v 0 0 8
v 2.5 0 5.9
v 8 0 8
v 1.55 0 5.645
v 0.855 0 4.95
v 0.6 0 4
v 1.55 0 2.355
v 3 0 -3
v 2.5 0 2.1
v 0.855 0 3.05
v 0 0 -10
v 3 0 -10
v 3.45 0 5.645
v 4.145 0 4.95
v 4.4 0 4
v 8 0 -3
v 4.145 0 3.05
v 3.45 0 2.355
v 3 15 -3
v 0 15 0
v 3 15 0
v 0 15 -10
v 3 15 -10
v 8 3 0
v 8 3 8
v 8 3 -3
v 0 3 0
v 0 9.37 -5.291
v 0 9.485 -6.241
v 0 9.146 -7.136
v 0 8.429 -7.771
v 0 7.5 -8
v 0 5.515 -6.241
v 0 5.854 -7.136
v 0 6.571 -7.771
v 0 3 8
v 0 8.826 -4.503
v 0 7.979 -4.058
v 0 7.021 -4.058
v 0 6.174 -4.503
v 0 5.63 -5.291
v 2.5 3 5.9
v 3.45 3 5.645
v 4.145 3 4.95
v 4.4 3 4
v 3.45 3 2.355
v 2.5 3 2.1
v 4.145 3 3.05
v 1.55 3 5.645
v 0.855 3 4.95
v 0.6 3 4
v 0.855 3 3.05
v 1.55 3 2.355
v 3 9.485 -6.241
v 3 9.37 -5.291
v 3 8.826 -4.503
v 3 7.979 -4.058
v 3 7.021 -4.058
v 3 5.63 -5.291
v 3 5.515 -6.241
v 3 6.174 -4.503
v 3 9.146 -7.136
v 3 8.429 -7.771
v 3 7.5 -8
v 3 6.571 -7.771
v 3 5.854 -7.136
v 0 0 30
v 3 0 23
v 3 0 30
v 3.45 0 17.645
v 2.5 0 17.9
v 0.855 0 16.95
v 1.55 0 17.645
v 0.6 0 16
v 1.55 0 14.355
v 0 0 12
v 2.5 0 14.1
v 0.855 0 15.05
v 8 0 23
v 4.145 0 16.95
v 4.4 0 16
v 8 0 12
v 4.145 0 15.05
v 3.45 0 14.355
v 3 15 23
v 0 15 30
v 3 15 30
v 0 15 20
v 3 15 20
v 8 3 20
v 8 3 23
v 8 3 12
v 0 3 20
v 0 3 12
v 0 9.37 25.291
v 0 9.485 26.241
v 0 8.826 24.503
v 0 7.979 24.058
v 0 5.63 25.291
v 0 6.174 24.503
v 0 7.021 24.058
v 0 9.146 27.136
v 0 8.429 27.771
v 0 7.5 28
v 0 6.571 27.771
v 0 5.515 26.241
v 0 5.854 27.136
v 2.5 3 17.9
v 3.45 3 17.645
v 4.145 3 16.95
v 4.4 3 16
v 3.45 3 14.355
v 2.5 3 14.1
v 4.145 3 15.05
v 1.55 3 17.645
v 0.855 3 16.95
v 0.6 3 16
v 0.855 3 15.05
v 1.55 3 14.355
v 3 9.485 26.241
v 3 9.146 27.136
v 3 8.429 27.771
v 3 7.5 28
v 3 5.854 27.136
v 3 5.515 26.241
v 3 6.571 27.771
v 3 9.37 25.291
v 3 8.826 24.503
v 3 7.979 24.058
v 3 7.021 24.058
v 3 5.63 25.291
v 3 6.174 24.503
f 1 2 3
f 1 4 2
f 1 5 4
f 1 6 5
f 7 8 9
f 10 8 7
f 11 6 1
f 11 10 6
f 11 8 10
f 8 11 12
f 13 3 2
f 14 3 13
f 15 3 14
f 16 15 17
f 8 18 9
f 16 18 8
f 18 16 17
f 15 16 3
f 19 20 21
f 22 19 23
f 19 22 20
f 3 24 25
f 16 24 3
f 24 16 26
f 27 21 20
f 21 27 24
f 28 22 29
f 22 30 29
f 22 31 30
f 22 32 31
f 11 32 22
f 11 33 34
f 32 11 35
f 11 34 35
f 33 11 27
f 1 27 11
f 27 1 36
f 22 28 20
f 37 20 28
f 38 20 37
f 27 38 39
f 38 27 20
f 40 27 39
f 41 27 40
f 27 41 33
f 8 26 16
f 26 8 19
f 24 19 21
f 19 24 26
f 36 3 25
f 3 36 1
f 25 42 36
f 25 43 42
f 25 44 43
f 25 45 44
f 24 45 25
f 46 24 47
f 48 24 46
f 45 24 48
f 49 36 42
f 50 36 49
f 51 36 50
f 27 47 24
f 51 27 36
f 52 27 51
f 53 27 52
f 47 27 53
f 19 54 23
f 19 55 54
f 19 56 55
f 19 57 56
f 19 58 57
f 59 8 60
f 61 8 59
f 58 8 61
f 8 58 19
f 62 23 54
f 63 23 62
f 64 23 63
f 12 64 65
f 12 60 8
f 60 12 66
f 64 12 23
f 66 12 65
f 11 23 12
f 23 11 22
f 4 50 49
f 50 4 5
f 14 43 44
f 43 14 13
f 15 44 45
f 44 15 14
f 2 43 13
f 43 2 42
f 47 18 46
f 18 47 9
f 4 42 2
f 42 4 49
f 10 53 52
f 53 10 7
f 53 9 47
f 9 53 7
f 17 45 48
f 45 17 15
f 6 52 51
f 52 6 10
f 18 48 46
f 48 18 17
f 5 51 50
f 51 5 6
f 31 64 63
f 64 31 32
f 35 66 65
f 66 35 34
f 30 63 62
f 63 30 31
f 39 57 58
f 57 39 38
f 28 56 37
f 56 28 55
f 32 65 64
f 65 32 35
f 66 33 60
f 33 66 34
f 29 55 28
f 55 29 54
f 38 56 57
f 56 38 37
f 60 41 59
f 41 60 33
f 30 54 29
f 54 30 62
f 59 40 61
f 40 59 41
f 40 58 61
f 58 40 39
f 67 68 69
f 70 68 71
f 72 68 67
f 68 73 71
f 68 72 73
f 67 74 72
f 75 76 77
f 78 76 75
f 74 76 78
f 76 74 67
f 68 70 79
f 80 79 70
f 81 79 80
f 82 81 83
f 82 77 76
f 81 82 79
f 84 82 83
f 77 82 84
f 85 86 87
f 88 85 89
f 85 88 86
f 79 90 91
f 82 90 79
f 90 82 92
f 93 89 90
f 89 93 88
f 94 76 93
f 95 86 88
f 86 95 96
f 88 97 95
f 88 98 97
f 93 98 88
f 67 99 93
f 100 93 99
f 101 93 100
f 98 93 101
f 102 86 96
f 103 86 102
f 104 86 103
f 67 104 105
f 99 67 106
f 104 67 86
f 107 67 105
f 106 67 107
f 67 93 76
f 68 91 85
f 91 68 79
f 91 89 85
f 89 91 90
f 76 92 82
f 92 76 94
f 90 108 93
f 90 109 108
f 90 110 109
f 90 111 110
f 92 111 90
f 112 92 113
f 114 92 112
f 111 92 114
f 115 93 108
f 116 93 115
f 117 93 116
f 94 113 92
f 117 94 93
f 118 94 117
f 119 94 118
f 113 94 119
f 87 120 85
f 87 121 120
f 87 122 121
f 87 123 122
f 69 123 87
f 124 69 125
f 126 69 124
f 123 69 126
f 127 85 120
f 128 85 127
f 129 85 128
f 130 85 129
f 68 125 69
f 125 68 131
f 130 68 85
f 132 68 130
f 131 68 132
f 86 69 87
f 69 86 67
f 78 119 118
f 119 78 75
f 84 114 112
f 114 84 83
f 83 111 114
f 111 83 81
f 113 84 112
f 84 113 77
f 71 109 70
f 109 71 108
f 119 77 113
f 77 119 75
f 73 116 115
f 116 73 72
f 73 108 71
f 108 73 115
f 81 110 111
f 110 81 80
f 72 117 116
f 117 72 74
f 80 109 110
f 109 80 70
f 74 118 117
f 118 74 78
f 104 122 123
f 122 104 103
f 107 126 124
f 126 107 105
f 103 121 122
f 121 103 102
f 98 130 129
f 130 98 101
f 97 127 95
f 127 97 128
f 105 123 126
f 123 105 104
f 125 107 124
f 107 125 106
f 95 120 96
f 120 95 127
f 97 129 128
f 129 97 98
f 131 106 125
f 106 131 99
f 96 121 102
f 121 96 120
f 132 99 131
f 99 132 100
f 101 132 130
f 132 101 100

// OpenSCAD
/** \file
 * mounting bracket for 15mm extrusion.
 */


module bracket()
{
	translate([0,0,-3]) linear_extrude(height=3)
		polygon([[0,0], [8,0], [8,3], [3,15], [0,15]]);

	cube([8,3,8]);
	translate([0,0,-10]) cube([3,15,8]);

}
	
/*
translate([15/2,0,3/2]) render() difference() {
	cube([15,10,3], center=true);
	translate([7.5/2,1,-2]) cylinder(r=4/2, h=5, $fs=1);
	translate([-7.5,1,3]) rotate([0,90,0]) cylinder(r=4,h=4);
}

translate([0,0,10/2]) rotate([0,90,0]) render() difference() {
	cube([10,10,3], center=true);
	translate([1,1,-2]) cylinder(r=4/2, h=5, $fs=1);
}
*/


module right()
{
render() difference()
{
	bracket();
	translate([2.5,4,8/2]) rotate([90,0,0]) cylinder(r=3.8/2, h=5, $fs=1);
	translate([-1,7.5,-10+4]) rotate([0,90,0]) cylinder(r=4/2, h=5, $fs=1);
}
}

right();

translate([0,0,20]) scale([1,1,-1]) right();
